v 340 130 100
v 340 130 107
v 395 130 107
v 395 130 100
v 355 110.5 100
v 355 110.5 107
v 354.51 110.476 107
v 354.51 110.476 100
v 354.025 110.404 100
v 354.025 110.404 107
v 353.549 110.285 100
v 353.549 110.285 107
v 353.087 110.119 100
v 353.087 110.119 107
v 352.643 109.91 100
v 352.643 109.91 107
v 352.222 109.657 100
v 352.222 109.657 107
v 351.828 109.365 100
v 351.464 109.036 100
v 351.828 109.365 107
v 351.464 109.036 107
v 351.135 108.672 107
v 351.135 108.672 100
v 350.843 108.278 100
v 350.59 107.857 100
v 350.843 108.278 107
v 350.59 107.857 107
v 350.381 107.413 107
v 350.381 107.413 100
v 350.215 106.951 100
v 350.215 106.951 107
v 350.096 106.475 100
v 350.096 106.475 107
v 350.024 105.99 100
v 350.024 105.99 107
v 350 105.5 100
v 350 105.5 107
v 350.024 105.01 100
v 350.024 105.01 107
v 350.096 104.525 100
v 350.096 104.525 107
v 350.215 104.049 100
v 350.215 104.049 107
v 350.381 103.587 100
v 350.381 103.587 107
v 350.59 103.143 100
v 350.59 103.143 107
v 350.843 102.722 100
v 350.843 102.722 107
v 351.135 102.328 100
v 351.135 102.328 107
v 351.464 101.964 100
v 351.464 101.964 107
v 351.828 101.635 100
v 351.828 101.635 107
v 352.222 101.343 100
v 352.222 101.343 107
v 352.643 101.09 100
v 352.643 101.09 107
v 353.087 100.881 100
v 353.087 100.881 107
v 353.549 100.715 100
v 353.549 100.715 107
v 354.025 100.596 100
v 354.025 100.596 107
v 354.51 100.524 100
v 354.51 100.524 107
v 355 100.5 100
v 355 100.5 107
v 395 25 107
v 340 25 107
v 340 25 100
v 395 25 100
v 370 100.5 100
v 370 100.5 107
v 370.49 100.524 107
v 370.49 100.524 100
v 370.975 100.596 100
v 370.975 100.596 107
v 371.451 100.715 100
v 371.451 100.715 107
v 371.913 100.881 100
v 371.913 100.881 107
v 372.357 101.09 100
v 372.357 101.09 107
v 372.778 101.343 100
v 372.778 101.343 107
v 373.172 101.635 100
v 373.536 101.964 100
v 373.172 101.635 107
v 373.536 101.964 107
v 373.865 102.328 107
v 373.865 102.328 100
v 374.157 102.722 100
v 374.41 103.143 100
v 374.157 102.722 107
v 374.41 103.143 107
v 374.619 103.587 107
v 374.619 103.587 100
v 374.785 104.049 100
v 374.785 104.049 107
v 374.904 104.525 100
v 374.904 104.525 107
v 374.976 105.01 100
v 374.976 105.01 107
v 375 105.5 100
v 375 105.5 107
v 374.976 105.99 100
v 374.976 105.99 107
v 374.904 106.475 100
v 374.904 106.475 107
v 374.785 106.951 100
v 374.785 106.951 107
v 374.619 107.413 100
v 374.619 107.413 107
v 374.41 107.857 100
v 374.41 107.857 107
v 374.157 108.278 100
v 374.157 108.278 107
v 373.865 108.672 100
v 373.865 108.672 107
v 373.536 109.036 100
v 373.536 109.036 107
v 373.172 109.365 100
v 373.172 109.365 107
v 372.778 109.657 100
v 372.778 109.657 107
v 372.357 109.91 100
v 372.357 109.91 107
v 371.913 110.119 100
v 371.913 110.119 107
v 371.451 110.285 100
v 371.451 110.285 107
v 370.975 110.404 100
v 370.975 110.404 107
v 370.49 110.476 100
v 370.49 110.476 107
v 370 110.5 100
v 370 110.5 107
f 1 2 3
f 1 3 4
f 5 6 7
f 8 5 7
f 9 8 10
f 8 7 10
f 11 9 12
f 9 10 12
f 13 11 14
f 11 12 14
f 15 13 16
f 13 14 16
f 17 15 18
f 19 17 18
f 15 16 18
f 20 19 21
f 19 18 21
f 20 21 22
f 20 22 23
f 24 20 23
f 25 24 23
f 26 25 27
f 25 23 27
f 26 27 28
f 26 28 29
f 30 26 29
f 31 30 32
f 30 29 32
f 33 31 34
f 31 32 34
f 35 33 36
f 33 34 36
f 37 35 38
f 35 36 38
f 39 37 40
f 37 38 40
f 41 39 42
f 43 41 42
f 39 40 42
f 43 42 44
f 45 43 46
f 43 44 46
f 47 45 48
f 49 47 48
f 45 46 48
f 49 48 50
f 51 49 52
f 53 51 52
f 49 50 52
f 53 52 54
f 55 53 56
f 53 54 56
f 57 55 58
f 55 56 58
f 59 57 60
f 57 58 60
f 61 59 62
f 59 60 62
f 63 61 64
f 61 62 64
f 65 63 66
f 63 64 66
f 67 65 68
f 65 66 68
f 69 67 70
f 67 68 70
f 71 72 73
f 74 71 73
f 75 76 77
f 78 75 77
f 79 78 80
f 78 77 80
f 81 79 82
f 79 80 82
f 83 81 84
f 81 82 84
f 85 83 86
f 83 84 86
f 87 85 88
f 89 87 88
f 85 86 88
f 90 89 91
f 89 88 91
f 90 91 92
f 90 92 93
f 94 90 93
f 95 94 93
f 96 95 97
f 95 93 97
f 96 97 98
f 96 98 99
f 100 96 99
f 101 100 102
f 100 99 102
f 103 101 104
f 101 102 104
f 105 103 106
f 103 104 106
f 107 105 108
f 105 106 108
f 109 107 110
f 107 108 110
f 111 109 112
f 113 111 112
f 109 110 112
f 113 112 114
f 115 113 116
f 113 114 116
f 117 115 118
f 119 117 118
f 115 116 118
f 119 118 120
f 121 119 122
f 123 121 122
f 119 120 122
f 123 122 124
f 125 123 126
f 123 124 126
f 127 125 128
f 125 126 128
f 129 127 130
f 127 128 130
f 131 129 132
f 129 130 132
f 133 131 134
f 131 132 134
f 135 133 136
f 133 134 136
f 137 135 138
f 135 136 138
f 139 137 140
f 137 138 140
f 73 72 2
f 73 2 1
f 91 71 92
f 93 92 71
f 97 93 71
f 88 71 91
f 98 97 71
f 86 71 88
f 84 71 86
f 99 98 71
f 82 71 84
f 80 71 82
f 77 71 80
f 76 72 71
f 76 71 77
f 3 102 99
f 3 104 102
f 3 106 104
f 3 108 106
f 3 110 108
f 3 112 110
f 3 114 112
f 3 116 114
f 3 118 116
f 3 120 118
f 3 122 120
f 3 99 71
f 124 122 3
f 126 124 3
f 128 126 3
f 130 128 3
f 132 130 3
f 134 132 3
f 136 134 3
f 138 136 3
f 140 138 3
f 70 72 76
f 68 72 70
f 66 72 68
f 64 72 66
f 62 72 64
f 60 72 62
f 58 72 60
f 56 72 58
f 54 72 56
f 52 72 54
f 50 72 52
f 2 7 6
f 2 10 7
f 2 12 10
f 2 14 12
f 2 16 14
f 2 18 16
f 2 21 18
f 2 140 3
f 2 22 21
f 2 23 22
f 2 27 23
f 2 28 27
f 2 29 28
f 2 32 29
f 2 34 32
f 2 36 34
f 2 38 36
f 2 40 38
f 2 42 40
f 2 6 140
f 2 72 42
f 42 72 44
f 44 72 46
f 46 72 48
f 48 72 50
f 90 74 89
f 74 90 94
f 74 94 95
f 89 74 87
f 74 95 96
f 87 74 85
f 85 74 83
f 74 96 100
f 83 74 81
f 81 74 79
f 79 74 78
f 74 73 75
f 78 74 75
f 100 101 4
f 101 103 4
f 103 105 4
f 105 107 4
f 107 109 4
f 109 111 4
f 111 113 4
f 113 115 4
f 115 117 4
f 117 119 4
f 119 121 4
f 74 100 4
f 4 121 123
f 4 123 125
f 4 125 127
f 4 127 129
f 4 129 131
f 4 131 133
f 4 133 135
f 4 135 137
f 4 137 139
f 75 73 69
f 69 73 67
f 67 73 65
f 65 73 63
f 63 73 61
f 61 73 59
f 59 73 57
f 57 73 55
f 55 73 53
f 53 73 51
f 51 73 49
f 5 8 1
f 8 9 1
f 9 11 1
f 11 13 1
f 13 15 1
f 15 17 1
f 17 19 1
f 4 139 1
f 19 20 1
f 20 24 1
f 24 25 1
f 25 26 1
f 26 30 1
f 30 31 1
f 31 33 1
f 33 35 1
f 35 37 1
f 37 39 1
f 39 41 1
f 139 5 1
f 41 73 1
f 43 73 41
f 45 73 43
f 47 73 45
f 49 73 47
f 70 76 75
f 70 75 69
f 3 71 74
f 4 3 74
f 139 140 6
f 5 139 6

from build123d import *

# Parameters (mm, degrees)
EXTRUDE_DEPTH = 7
BOX074_W      = 7
BOX074_H      = 105
BOX074_DEPTH  = 55


with BuildPart() as wirecut:
    # Sketch014 (on Face1 of Box074) → Extrude (new body)
    with BuildSketch(Plane(origin=(340, 25, 107), x_dir=(0, -1, 0), z_dir=(0, 0, 1))):
        with BuildLine():
            ThreePointArc((-75.5, 30), (-80.5, 35), (-85.5, 30))
            Line((-85.5, 30), (-85.5, 15))
            ThreePointArc((-85.5, 15), (-80.5, 10), (-75.5, 15))
            Line((-75.5, 30), (-75.5, 15))
        make_face()
    extrude(amount=-EXTRUDE_DEPTH)


with BuildPart() as cut003:
    # Box074 → Box074 (new body)
    with BuildSketch(Plane(origin=(340, 25, 107), x_dir=(0, 0, -1), z_dir=(1, 0, 0))):
        with Locations((3.5, 52.5)):
            Rectangle(BOX074_W, BOX074_H)
    extrude(amount=BOX074_DEPTH)

    # Cut003: cut Wirecut
    add(wirecut.part, mode=Mode.SUBTRACT)


solid = cut003.part
